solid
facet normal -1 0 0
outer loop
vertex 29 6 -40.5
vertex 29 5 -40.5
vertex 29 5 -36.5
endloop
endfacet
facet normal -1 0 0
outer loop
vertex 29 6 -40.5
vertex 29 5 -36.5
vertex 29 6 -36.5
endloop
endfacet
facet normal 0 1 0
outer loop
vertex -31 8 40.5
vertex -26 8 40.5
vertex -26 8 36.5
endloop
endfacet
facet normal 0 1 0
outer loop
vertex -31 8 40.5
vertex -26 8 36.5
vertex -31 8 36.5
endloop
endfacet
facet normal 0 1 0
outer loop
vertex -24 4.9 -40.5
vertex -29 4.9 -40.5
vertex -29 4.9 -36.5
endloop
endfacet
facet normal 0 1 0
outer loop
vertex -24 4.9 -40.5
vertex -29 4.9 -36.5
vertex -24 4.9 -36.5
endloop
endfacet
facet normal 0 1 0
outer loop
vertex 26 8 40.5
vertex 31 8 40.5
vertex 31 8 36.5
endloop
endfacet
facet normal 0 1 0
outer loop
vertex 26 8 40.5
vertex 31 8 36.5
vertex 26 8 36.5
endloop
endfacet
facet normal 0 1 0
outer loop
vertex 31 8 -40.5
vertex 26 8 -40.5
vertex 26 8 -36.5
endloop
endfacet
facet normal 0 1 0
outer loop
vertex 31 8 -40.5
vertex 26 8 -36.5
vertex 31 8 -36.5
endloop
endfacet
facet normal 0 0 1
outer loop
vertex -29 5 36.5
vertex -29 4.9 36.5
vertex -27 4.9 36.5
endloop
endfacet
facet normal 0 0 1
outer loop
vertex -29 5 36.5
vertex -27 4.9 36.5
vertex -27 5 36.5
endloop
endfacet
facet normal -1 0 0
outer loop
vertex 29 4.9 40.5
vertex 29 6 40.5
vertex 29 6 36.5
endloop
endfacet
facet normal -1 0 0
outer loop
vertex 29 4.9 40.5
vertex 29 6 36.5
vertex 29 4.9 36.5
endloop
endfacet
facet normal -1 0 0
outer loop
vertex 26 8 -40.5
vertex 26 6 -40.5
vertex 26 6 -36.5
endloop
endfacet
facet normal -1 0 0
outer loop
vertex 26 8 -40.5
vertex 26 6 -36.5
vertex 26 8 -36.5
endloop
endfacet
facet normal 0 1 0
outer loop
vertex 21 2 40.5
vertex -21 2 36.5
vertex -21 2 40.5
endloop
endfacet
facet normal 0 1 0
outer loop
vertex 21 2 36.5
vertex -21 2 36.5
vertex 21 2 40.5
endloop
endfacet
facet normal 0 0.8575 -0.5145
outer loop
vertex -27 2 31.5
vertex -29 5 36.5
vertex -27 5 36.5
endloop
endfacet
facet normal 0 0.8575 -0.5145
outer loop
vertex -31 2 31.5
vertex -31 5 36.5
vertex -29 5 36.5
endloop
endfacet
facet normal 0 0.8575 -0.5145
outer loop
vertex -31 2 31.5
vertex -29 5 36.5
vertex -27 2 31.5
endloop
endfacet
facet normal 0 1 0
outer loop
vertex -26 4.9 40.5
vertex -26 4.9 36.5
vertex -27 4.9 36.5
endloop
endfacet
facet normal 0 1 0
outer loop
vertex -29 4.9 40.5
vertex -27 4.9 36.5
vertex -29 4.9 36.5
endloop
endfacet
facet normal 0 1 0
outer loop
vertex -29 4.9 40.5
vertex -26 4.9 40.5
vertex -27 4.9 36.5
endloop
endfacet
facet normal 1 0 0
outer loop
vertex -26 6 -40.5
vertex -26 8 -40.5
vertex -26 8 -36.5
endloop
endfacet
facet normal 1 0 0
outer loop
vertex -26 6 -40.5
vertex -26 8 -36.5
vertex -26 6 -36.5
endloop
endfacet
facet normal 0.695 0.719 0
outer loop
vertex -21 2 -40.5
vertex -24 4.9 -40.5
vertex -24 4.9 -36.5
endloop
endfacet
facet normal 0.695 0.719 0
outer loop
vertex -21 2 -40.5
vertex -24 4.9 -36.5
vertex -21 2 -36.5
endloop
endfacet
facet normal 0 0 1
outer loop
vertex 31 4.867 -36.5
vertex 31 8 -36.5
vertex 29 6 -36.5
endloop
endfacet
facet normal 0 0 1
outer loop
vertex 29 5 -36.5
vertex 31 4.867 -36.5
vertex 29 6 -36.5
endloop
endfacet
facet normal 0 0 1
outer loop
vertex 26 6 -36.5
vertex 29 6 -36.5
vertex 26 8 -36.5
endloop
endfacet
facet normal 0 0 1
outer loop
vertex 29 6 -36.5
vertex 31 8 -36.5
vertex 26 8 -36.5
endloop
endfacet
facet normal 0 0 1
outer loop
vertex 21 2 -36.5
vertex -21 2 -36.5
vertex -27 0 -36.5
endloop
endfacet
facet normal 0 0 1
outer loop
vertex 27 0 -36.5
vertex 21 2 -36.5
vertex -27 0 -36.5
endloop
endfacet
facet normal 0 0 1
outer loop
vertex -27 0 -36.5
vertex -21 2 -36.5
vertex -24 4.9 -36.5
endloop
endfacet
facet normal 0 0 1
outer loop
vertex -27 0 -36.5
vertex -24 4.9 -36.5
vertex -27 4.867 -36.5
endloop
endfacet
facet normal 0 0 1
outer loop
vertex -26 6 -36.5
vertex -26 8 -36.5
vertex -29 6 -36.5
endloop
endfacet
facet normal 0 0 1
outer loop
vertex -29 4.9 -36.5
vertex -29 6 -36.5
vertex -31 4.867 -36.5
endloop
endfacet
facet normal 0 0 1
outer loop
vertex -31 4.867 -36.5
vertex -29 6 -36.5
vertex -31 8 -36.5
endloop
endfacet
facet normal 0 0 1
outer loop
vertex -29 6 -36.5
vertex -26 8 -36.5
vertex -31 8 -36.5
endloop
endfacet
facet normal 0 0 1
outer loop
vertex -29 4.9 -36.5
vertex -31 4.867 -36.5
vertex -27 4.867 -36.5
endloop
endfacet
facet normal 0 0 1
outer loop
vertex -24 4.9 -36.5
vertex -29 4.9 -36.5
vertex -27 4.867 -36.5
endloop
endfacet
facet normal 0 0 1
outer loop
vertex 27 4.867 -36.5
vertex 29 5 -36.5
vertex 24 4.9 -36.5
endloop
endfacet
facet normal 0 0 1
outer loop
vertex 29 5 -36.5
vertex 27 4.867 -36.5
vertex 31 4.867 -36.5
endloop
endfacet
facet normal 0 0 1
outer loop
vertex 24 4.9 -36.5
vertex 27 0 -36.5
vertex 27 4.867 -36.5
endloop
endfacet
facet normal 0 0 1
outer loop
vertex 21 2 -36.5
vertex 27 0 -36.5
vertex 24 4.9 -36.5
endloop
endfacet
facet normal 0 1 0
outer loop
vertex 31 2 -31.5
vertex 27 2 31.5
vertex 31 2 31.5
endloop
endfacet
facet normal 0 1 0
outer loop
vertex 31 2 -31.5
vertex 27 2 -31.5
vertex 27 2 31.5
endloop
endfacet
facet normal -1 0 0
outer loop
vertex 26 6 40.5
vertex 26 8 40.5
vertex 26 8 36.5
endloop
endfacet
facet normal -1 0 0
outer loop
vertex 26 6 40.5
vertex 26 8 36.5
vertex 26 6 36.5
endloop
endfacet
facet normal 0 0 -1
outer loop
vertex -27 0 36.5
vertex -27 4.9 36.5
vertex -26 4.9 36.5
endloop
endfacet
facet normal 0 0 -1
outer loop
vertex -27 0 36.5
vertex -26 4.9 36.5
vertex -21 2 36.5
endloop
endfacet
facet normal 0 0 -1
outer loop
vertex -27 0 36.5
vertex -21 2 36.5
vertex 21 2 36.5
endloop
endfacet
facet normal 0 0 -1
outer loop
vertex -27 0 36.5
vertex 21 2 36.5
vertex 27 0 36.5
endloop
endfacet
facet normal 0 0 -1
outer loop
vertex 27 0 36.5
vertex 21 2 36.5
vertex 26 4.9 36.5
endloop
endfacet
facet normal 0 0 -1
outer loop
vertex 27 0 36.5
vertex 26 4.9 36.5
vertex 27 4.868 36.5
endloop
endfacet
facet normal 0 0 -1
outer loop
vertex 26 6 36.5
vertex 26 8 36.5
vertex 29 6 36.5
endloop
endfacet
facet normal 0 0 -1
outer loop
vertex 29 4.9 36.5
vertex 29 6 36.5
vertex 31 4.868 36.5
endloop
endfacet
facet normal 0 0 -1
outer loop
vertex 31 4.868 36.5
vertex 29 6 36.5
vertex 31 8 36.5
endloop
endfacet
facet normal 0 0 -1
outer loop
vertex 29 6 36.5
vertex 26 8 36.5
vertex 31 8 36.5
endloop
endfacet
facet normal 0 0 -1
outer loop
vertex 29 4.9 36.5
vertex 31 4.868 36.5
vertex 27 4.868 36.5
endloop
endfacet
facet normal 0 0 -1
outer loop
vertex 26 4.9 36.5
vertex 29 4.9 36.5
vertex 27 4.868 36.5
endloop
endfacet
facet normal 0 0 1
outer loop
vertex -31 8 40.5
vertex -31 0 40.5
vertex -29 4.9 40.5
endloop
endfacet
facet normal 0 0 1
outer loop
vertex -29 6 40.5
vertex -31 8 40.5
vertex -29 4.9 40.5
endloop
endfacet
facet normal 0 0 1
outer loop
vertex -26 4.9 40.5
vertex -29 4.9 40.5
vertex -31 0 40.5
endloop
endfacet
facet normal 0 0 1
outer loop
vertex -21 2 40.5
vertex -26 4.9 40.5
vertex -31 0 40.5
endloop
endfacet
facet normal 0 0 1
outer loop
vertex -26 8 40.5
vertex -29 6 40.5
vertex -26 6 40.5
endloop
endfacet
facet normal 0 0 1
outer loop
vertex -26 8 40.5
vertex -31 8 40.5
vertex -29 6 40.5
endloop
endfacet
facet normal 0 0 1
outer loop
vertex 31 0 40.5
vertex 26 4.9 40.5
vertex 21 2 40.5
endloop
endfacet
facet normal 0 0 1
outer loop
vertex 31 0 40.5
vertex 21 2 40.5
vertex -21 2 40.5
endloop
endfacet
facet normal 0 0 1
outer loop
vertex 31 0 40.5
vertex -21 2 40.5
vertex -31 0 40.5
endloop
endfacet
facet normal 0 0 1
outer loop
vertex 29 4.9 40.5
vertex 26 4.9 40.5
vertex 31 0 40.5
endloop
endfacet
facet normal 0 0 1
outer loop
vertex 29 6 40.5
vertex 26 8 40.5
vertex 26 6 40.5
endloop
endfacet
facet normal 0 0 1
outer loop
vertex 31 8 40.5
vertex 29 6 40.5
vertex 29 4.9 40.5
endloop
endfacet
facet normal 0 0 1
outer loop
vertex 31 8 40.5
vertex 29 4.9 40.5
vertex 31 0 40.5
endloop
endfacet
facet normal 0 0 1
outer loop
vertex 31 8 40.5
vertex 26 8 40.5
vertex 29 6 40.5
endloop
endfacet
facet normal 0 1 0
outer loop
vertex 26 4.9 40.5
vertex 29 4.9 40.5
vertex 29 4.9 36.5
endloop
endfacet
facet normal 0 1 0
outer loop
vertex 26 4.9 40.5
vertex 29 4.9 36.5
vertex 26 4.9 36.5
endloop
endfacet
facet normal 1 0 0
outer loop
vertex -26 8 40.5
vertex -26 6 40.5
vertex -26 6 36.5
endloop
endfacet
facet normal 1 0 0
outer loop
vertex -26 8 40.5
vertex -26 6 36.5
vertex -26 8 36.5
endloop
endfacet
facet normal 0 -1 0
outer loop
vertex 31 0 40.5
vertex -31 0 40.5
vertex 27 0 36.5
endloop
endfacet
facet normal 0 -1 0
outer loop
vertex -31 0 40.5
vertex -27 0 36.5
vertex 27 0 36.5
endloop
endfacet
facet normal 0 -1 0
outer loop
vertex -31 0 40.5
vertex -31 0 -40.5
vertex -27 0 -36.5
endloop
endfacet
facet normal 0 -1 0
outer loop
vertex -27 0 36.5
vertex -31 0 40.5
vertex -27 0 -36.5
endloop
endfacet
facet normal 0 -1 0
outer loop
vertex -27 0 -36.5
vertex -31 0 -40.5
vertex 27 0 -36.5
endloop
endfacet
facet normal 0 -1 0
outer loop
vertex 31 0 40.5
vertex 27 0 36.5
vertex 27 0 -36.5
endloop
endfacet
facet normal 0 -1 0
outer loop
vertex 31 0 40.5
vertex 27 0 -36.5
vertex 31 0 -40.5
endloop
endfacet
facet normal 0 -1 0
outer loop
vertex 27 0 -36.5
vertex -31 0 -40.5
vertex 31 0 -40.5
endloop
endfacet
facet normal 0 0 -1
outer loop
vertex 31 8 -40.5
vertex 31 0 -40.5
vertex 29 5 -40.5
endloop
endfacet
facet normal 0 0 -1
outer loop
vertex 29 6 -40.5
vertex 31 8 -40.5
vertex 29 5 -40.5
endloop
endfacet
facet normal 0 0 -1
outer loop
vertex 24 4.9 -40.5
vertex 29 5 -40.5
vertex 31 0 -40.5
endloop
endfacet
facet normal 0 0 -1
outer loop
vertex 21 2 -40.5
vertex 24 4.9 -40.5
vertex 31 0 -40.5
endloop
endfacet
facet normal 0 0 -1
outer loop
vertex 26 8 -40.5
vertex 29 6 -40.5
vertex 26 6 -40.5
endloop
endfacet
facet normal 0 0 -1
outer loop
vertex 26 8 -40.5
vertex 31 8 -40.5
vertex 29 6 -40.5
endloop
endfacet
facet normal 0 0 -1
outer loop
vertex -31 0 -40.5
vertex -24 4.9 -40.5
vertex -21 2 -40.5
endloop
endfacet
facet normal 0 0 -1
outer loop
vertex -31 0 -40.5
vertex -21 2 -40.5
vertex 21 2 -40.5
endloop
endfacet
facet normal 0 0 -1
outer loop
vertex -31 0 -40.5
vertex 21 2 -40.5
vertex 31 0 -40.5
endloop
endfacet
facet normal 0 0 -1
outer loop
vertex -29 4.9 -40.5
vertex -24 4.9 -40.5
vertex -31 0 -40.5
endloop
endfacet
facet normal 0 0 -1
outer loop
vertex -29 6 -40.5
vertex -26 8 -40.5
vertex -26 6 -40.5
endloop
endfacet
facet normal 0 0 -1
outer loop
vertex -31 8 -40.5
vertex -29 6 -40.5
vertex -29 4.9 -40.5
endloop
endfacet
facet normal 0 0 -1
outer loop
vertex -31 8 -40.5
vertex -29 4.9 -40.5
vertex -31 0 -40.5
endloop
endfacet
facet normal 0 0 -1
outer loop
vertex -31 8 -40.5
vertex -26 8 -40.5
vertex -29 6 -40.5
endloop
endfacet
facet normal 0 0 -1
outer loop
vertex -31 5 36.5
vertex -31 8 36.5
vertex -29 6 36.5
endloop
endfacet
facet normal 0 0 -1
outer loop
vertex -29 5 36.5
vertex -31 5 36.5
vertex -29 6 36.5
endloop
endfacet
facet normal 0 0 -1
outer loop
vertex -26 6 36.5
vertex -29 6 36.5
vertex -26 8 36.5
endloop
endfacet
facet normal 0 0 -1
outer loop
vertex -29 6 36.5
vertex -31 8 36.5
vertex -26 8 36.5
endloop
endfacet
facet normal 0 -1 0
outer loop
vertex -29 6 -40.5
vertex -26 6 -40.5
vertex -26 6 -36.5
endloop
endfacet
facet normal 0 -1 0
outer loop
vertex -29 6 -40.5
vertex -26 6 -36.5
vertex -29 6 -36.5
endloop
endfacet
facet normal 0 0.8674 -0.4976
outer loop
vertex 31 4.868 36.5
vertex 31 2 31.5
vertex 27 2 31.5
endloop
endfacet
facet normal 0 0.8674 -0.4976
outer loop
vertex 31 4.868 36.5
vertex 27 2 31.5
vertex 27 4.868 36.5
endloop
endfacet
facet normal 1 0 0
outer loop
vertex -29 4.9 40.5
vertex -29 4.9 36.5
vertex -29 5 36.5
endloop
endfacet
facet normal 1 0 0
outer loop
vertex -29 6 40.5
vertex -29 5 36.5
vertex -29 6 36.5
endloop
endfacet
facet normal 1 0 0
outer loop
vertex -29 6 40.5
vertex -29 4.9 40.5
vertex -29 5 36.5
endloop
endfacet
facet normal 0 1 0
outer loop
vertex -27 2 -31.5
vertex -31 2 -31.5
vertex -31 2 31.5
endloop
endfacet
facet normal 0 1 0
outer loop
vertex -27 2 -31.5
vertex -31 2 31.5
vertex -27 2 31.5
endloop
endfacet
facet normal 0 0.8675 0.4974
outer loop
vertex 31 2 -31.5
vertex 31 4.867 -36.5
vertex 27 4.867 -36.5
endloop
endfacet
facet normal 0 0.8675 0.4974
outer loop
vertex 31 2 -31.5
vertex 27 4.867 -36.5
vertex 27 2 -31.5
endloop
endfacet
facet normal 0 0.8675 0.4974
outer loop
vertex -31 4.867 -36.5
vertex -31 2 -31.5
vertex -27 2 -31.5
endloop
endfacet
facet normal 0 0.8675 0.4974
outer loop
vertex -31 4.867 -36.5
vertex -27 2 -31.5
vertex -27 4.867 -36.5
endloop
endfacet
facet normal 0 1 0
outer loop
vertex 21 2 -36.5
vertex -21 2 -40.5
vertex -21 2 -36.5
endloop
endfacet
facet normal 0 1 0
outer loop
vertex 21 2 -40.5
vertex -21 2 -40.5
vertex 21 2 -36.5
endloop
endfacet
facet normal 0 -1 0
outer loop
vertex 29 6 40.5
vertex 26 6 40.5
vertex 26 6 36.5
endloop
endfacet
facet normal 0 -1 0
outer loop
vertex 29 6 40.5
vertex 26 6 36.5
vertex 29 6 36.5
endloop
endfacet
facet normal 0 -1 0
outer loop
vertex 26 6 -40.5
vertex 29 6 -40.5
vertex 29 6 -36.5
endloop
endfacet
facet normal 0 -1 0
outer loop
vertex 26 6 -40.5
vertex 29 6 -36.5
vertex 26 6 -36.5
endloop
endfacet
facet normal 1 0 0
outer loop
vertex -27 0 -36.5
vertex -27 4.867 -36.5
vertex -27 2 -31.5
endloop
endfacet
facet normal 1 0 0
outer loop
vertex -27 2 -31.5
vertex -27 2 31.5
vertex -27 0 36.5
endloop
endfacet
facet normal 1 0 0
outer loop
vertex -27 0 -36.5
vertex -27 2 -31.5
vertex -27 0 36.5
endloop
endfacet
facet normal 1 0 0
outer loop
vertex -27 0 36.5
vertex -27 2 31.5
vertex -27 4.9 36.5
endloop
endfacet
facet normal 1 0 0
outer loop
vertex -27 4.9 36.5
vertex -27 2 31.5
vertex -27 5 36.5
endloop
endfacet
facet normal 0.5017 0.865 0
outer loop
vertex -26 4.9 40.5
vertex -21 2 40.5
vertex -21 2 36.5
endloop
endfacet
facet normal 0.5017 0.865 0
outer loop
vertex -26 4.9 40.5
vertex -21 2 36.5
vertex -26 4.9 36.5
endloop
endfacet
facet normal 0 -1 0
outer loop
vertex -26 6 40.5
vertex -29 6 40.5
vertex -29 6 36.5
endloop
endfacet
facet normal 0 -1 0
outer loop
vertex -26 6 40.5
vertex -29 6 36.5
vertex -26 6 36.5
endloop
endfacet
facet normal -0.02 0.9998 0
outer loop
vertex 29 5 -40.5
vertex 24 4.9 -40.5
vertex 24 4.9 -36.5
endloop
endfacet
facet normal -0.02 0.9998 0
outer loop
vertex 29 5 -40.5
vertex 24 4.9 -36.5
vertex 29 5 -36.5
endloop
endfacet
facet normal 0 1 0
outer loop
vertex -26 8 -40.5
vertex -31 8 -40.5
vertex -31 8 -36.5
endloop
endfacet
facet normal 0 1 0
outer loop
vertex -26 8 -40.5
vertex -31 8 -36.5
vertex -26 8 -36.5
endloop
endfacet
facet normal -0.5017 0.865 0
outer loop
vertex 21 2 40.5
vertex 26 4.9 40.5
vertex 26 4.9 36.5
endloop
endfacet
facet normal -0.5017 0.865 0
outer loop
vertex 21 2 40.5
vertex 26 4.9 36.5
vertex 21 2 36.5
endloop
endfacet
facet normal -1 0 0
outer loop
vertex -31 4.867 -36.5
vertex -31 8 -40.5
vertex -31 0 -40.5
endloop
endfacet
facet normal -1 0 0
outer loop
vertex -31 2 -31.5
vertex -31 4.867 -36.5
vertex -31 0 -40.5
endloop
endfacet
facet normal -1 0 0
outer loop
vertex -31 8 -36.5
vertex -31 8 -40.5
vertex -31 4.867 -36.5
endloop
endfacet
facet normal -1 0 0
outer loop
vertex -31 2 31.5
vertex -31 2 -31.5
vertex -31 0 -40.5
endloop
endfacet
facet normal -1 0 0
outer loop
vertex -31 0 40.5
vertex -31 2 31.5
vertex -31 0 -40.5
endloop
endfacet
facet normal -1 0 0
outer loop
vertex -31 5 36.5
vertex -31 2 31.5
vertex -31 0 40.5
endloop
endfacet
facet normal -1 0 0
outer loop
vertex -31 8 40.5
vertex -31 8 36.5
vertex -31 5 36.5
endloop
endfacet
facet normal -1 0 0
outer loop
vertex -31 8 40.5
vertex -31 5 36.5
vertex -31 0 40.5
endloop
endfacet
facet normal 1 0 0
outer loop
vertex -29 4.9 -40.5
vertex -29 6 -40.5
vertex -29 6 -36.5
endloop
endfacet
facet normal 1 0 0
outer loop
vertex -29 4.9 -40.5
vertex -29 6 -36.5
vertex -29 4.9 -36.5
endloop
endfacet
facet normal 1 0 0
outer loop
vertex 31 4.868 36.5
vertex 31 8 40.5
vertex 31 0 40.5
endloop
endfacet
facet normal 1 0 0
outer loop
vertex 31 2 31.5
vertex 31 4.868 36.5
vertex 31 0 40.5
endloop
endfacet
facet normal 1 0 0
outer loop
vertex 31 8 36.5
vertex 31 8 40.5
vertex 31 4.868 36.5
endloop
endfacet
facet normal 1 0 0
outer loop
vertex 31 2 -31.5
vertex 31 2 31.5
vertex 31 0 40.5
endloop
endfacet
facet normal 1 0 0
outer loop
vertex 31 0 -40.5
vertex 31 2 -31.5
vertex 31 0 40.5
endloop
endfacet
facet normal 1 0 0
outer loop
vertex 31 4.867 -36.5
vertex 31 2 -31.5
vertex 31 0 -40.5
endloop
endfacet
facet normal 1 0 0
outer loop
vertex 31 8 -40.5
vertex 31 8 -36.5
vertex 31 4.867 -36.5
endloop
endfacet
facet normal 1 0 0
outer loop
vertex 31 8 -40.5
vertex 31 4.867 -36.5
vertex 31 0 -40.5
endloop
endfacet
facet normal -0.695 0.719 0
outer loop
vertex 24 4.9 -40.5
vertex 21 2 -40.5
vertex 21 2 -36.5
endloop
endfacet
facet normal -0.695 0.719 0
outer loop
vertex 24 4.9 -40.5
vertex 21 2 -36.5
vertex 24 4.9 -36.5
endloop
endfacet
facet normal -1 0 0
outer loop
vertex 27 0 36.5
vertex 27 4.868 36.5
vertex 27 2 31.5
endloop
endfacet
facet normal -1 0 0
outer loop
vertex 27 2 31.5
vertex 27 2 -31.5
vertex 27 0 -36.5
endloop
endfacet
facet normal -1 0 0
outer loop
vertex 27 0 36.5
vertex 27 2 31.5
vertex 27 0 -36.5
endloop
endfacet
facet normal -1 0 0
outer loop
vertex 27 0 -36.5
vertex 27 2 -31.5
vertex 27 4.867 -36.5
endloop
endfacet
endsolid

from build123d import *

# Parameters (mm, degrees)
SKETCH_1_W      = 62
SKETCH_1_H      = 81
SKETCH_1_W_2    = 54
SKETCH_1_H_2    = 73
EXTRUDE_1_DEPTH = 2
EXTRUDE_2_DEPTH = 4
EXTRUDE_3_DEPTH = 4
EXTRUDE_4_DEPTH = 4
EXTRUDE_5_DEPTH = 4
EXTRUDE_6_DEPTH = 4
EXTRUDE_7_DEPTH = 4
EXTRUDE_8_DEPTH = 4
EXTRUDE_9_DEPTH = 4


with BuildPart() as part:
    # Эскиз1 → Бобышка-Вытянуть1 (new body)
    with BuildSketch(Plane(origin=(0, 0, 0), x_dir=(1, 0, 0), z_dir=(0, 1, 0))):
        Rectangle(SKETCH_1_W, SKETCH_1_H)
        Rectangle(SKETCH_1_W_2, SKETCH_1_H_2, mode=Mode.SUBTRACT)
    extrude(amount=EXTRUDE_1_DEPTH)

    # Эскиз6 → Бобышка-Вытянуть2 (add)
    with BuildSketch(Plane.XY.offset(40.5)):
        Polygon((26, 2), (31, 2), (31, 8), (26, 8), (26, 6), (29, 6), (29, 4.9), (26, 4.9), align=None)
        Polygon((21, 2), (26, 2), (26, 4.9), align=None)
    extrude(amount=-EXTRUDE_2_DEPTH)

    # Эскиз8 → Бобышка-Вытянуть3 (add)
    with BuildSketch(Plane.XY.offset(40.5)):
        Polygon((-31, 8), (-31, 2), (-26, 2), (-26, 4.9), (-29, 4.9), (-29, 6), (-26, 6), (-26, 8), align=None)
        Polygon((-26, 4.9), (-26, 2), (-21, 2), align=None)
    extrude(amount=-EXTRUDE_3_DEPTH)

    # Эскиз10 → Бобышка-Вытянуть4 (add)
    with BuildSketch(Plane(origin=(0, 0, -40.5), x_dir=(-1, 0, 0), z_dir=(0, 0, -1))):
        Polygon((-31, 8), (-31, 2), (-24, 2), (-24, 4.9), (-29, 5), (-29, 6), (-26, 6), (-26, 8), align=None)
        Polygon((-24, 4.9), (-24, 2), (-21, 2), align=None)
    extrude(amount=-EXTRUDE_4_DEPTH)

    # Эскиз11 → Бобышка-Вытянуть5 (add)
    with BuildSketch(Plane(origin=(0, 0, -40.5), x_dir=(-1, 0, 0), z_dir=(0, 0, -1))):
        Polygon((24, 2), (31, 2), (31, 8), (26, 8), (26, 6), (29, 6), (29, 4.9), (24, 4.9), align=None)
        Polygon((21, 2), (24, 2), (24, 4.9), align=None)
    extrude(amount=-EXTRUDE_5_DEPTH)

    # Эскиз12 → Бобышка-Вытянуть6 (add)
    with BuildSketch(Plane.ZY.offset(31)):
        Polygon((-36.5, 2), (-31.5, 2), (-36.5, 4.866692533), align=None)
    extrude(amount=-EXTRUDE_6_DEPTH)

    # Эскиз13 → Бобышка-Вытянуть7 (add)
    with BuildSketch(Plane.ZY.offset(31)):
        Polygon((36.5, 2), (36.5, 5), (31.5, 2), align=None)
    extrude(amount=-EXTRUDE_7_DEPTH)

    # Эскиз17 → Бобышка-Вытянуть8 (add)
    with BuildSketch(Plane(origin=(31, 0, 0), x_dir=(0, 0, -1), z_dir=(1, 0, 0))):
        Polygon((-31.5, 2), (-36.5, 4.867780804), (-36.5, 2), align=None)
    extrude(amount=-EXTRUDE_8_DEPTH)

    # Эскиз21 → Бобышка-Вытянуть9 (add)
    with BuildSketch(Plane(origin=(31, 0, 0), x_dir=(0, 0, -1), z_dir=(1, 0, 0))):
        Polygon((36.5, 2), (36.5, 4.866692533), (31.5, 2), align=None)
    extrude(amount=-EXTRUDE_9_DEPTH)


solid = part.part
